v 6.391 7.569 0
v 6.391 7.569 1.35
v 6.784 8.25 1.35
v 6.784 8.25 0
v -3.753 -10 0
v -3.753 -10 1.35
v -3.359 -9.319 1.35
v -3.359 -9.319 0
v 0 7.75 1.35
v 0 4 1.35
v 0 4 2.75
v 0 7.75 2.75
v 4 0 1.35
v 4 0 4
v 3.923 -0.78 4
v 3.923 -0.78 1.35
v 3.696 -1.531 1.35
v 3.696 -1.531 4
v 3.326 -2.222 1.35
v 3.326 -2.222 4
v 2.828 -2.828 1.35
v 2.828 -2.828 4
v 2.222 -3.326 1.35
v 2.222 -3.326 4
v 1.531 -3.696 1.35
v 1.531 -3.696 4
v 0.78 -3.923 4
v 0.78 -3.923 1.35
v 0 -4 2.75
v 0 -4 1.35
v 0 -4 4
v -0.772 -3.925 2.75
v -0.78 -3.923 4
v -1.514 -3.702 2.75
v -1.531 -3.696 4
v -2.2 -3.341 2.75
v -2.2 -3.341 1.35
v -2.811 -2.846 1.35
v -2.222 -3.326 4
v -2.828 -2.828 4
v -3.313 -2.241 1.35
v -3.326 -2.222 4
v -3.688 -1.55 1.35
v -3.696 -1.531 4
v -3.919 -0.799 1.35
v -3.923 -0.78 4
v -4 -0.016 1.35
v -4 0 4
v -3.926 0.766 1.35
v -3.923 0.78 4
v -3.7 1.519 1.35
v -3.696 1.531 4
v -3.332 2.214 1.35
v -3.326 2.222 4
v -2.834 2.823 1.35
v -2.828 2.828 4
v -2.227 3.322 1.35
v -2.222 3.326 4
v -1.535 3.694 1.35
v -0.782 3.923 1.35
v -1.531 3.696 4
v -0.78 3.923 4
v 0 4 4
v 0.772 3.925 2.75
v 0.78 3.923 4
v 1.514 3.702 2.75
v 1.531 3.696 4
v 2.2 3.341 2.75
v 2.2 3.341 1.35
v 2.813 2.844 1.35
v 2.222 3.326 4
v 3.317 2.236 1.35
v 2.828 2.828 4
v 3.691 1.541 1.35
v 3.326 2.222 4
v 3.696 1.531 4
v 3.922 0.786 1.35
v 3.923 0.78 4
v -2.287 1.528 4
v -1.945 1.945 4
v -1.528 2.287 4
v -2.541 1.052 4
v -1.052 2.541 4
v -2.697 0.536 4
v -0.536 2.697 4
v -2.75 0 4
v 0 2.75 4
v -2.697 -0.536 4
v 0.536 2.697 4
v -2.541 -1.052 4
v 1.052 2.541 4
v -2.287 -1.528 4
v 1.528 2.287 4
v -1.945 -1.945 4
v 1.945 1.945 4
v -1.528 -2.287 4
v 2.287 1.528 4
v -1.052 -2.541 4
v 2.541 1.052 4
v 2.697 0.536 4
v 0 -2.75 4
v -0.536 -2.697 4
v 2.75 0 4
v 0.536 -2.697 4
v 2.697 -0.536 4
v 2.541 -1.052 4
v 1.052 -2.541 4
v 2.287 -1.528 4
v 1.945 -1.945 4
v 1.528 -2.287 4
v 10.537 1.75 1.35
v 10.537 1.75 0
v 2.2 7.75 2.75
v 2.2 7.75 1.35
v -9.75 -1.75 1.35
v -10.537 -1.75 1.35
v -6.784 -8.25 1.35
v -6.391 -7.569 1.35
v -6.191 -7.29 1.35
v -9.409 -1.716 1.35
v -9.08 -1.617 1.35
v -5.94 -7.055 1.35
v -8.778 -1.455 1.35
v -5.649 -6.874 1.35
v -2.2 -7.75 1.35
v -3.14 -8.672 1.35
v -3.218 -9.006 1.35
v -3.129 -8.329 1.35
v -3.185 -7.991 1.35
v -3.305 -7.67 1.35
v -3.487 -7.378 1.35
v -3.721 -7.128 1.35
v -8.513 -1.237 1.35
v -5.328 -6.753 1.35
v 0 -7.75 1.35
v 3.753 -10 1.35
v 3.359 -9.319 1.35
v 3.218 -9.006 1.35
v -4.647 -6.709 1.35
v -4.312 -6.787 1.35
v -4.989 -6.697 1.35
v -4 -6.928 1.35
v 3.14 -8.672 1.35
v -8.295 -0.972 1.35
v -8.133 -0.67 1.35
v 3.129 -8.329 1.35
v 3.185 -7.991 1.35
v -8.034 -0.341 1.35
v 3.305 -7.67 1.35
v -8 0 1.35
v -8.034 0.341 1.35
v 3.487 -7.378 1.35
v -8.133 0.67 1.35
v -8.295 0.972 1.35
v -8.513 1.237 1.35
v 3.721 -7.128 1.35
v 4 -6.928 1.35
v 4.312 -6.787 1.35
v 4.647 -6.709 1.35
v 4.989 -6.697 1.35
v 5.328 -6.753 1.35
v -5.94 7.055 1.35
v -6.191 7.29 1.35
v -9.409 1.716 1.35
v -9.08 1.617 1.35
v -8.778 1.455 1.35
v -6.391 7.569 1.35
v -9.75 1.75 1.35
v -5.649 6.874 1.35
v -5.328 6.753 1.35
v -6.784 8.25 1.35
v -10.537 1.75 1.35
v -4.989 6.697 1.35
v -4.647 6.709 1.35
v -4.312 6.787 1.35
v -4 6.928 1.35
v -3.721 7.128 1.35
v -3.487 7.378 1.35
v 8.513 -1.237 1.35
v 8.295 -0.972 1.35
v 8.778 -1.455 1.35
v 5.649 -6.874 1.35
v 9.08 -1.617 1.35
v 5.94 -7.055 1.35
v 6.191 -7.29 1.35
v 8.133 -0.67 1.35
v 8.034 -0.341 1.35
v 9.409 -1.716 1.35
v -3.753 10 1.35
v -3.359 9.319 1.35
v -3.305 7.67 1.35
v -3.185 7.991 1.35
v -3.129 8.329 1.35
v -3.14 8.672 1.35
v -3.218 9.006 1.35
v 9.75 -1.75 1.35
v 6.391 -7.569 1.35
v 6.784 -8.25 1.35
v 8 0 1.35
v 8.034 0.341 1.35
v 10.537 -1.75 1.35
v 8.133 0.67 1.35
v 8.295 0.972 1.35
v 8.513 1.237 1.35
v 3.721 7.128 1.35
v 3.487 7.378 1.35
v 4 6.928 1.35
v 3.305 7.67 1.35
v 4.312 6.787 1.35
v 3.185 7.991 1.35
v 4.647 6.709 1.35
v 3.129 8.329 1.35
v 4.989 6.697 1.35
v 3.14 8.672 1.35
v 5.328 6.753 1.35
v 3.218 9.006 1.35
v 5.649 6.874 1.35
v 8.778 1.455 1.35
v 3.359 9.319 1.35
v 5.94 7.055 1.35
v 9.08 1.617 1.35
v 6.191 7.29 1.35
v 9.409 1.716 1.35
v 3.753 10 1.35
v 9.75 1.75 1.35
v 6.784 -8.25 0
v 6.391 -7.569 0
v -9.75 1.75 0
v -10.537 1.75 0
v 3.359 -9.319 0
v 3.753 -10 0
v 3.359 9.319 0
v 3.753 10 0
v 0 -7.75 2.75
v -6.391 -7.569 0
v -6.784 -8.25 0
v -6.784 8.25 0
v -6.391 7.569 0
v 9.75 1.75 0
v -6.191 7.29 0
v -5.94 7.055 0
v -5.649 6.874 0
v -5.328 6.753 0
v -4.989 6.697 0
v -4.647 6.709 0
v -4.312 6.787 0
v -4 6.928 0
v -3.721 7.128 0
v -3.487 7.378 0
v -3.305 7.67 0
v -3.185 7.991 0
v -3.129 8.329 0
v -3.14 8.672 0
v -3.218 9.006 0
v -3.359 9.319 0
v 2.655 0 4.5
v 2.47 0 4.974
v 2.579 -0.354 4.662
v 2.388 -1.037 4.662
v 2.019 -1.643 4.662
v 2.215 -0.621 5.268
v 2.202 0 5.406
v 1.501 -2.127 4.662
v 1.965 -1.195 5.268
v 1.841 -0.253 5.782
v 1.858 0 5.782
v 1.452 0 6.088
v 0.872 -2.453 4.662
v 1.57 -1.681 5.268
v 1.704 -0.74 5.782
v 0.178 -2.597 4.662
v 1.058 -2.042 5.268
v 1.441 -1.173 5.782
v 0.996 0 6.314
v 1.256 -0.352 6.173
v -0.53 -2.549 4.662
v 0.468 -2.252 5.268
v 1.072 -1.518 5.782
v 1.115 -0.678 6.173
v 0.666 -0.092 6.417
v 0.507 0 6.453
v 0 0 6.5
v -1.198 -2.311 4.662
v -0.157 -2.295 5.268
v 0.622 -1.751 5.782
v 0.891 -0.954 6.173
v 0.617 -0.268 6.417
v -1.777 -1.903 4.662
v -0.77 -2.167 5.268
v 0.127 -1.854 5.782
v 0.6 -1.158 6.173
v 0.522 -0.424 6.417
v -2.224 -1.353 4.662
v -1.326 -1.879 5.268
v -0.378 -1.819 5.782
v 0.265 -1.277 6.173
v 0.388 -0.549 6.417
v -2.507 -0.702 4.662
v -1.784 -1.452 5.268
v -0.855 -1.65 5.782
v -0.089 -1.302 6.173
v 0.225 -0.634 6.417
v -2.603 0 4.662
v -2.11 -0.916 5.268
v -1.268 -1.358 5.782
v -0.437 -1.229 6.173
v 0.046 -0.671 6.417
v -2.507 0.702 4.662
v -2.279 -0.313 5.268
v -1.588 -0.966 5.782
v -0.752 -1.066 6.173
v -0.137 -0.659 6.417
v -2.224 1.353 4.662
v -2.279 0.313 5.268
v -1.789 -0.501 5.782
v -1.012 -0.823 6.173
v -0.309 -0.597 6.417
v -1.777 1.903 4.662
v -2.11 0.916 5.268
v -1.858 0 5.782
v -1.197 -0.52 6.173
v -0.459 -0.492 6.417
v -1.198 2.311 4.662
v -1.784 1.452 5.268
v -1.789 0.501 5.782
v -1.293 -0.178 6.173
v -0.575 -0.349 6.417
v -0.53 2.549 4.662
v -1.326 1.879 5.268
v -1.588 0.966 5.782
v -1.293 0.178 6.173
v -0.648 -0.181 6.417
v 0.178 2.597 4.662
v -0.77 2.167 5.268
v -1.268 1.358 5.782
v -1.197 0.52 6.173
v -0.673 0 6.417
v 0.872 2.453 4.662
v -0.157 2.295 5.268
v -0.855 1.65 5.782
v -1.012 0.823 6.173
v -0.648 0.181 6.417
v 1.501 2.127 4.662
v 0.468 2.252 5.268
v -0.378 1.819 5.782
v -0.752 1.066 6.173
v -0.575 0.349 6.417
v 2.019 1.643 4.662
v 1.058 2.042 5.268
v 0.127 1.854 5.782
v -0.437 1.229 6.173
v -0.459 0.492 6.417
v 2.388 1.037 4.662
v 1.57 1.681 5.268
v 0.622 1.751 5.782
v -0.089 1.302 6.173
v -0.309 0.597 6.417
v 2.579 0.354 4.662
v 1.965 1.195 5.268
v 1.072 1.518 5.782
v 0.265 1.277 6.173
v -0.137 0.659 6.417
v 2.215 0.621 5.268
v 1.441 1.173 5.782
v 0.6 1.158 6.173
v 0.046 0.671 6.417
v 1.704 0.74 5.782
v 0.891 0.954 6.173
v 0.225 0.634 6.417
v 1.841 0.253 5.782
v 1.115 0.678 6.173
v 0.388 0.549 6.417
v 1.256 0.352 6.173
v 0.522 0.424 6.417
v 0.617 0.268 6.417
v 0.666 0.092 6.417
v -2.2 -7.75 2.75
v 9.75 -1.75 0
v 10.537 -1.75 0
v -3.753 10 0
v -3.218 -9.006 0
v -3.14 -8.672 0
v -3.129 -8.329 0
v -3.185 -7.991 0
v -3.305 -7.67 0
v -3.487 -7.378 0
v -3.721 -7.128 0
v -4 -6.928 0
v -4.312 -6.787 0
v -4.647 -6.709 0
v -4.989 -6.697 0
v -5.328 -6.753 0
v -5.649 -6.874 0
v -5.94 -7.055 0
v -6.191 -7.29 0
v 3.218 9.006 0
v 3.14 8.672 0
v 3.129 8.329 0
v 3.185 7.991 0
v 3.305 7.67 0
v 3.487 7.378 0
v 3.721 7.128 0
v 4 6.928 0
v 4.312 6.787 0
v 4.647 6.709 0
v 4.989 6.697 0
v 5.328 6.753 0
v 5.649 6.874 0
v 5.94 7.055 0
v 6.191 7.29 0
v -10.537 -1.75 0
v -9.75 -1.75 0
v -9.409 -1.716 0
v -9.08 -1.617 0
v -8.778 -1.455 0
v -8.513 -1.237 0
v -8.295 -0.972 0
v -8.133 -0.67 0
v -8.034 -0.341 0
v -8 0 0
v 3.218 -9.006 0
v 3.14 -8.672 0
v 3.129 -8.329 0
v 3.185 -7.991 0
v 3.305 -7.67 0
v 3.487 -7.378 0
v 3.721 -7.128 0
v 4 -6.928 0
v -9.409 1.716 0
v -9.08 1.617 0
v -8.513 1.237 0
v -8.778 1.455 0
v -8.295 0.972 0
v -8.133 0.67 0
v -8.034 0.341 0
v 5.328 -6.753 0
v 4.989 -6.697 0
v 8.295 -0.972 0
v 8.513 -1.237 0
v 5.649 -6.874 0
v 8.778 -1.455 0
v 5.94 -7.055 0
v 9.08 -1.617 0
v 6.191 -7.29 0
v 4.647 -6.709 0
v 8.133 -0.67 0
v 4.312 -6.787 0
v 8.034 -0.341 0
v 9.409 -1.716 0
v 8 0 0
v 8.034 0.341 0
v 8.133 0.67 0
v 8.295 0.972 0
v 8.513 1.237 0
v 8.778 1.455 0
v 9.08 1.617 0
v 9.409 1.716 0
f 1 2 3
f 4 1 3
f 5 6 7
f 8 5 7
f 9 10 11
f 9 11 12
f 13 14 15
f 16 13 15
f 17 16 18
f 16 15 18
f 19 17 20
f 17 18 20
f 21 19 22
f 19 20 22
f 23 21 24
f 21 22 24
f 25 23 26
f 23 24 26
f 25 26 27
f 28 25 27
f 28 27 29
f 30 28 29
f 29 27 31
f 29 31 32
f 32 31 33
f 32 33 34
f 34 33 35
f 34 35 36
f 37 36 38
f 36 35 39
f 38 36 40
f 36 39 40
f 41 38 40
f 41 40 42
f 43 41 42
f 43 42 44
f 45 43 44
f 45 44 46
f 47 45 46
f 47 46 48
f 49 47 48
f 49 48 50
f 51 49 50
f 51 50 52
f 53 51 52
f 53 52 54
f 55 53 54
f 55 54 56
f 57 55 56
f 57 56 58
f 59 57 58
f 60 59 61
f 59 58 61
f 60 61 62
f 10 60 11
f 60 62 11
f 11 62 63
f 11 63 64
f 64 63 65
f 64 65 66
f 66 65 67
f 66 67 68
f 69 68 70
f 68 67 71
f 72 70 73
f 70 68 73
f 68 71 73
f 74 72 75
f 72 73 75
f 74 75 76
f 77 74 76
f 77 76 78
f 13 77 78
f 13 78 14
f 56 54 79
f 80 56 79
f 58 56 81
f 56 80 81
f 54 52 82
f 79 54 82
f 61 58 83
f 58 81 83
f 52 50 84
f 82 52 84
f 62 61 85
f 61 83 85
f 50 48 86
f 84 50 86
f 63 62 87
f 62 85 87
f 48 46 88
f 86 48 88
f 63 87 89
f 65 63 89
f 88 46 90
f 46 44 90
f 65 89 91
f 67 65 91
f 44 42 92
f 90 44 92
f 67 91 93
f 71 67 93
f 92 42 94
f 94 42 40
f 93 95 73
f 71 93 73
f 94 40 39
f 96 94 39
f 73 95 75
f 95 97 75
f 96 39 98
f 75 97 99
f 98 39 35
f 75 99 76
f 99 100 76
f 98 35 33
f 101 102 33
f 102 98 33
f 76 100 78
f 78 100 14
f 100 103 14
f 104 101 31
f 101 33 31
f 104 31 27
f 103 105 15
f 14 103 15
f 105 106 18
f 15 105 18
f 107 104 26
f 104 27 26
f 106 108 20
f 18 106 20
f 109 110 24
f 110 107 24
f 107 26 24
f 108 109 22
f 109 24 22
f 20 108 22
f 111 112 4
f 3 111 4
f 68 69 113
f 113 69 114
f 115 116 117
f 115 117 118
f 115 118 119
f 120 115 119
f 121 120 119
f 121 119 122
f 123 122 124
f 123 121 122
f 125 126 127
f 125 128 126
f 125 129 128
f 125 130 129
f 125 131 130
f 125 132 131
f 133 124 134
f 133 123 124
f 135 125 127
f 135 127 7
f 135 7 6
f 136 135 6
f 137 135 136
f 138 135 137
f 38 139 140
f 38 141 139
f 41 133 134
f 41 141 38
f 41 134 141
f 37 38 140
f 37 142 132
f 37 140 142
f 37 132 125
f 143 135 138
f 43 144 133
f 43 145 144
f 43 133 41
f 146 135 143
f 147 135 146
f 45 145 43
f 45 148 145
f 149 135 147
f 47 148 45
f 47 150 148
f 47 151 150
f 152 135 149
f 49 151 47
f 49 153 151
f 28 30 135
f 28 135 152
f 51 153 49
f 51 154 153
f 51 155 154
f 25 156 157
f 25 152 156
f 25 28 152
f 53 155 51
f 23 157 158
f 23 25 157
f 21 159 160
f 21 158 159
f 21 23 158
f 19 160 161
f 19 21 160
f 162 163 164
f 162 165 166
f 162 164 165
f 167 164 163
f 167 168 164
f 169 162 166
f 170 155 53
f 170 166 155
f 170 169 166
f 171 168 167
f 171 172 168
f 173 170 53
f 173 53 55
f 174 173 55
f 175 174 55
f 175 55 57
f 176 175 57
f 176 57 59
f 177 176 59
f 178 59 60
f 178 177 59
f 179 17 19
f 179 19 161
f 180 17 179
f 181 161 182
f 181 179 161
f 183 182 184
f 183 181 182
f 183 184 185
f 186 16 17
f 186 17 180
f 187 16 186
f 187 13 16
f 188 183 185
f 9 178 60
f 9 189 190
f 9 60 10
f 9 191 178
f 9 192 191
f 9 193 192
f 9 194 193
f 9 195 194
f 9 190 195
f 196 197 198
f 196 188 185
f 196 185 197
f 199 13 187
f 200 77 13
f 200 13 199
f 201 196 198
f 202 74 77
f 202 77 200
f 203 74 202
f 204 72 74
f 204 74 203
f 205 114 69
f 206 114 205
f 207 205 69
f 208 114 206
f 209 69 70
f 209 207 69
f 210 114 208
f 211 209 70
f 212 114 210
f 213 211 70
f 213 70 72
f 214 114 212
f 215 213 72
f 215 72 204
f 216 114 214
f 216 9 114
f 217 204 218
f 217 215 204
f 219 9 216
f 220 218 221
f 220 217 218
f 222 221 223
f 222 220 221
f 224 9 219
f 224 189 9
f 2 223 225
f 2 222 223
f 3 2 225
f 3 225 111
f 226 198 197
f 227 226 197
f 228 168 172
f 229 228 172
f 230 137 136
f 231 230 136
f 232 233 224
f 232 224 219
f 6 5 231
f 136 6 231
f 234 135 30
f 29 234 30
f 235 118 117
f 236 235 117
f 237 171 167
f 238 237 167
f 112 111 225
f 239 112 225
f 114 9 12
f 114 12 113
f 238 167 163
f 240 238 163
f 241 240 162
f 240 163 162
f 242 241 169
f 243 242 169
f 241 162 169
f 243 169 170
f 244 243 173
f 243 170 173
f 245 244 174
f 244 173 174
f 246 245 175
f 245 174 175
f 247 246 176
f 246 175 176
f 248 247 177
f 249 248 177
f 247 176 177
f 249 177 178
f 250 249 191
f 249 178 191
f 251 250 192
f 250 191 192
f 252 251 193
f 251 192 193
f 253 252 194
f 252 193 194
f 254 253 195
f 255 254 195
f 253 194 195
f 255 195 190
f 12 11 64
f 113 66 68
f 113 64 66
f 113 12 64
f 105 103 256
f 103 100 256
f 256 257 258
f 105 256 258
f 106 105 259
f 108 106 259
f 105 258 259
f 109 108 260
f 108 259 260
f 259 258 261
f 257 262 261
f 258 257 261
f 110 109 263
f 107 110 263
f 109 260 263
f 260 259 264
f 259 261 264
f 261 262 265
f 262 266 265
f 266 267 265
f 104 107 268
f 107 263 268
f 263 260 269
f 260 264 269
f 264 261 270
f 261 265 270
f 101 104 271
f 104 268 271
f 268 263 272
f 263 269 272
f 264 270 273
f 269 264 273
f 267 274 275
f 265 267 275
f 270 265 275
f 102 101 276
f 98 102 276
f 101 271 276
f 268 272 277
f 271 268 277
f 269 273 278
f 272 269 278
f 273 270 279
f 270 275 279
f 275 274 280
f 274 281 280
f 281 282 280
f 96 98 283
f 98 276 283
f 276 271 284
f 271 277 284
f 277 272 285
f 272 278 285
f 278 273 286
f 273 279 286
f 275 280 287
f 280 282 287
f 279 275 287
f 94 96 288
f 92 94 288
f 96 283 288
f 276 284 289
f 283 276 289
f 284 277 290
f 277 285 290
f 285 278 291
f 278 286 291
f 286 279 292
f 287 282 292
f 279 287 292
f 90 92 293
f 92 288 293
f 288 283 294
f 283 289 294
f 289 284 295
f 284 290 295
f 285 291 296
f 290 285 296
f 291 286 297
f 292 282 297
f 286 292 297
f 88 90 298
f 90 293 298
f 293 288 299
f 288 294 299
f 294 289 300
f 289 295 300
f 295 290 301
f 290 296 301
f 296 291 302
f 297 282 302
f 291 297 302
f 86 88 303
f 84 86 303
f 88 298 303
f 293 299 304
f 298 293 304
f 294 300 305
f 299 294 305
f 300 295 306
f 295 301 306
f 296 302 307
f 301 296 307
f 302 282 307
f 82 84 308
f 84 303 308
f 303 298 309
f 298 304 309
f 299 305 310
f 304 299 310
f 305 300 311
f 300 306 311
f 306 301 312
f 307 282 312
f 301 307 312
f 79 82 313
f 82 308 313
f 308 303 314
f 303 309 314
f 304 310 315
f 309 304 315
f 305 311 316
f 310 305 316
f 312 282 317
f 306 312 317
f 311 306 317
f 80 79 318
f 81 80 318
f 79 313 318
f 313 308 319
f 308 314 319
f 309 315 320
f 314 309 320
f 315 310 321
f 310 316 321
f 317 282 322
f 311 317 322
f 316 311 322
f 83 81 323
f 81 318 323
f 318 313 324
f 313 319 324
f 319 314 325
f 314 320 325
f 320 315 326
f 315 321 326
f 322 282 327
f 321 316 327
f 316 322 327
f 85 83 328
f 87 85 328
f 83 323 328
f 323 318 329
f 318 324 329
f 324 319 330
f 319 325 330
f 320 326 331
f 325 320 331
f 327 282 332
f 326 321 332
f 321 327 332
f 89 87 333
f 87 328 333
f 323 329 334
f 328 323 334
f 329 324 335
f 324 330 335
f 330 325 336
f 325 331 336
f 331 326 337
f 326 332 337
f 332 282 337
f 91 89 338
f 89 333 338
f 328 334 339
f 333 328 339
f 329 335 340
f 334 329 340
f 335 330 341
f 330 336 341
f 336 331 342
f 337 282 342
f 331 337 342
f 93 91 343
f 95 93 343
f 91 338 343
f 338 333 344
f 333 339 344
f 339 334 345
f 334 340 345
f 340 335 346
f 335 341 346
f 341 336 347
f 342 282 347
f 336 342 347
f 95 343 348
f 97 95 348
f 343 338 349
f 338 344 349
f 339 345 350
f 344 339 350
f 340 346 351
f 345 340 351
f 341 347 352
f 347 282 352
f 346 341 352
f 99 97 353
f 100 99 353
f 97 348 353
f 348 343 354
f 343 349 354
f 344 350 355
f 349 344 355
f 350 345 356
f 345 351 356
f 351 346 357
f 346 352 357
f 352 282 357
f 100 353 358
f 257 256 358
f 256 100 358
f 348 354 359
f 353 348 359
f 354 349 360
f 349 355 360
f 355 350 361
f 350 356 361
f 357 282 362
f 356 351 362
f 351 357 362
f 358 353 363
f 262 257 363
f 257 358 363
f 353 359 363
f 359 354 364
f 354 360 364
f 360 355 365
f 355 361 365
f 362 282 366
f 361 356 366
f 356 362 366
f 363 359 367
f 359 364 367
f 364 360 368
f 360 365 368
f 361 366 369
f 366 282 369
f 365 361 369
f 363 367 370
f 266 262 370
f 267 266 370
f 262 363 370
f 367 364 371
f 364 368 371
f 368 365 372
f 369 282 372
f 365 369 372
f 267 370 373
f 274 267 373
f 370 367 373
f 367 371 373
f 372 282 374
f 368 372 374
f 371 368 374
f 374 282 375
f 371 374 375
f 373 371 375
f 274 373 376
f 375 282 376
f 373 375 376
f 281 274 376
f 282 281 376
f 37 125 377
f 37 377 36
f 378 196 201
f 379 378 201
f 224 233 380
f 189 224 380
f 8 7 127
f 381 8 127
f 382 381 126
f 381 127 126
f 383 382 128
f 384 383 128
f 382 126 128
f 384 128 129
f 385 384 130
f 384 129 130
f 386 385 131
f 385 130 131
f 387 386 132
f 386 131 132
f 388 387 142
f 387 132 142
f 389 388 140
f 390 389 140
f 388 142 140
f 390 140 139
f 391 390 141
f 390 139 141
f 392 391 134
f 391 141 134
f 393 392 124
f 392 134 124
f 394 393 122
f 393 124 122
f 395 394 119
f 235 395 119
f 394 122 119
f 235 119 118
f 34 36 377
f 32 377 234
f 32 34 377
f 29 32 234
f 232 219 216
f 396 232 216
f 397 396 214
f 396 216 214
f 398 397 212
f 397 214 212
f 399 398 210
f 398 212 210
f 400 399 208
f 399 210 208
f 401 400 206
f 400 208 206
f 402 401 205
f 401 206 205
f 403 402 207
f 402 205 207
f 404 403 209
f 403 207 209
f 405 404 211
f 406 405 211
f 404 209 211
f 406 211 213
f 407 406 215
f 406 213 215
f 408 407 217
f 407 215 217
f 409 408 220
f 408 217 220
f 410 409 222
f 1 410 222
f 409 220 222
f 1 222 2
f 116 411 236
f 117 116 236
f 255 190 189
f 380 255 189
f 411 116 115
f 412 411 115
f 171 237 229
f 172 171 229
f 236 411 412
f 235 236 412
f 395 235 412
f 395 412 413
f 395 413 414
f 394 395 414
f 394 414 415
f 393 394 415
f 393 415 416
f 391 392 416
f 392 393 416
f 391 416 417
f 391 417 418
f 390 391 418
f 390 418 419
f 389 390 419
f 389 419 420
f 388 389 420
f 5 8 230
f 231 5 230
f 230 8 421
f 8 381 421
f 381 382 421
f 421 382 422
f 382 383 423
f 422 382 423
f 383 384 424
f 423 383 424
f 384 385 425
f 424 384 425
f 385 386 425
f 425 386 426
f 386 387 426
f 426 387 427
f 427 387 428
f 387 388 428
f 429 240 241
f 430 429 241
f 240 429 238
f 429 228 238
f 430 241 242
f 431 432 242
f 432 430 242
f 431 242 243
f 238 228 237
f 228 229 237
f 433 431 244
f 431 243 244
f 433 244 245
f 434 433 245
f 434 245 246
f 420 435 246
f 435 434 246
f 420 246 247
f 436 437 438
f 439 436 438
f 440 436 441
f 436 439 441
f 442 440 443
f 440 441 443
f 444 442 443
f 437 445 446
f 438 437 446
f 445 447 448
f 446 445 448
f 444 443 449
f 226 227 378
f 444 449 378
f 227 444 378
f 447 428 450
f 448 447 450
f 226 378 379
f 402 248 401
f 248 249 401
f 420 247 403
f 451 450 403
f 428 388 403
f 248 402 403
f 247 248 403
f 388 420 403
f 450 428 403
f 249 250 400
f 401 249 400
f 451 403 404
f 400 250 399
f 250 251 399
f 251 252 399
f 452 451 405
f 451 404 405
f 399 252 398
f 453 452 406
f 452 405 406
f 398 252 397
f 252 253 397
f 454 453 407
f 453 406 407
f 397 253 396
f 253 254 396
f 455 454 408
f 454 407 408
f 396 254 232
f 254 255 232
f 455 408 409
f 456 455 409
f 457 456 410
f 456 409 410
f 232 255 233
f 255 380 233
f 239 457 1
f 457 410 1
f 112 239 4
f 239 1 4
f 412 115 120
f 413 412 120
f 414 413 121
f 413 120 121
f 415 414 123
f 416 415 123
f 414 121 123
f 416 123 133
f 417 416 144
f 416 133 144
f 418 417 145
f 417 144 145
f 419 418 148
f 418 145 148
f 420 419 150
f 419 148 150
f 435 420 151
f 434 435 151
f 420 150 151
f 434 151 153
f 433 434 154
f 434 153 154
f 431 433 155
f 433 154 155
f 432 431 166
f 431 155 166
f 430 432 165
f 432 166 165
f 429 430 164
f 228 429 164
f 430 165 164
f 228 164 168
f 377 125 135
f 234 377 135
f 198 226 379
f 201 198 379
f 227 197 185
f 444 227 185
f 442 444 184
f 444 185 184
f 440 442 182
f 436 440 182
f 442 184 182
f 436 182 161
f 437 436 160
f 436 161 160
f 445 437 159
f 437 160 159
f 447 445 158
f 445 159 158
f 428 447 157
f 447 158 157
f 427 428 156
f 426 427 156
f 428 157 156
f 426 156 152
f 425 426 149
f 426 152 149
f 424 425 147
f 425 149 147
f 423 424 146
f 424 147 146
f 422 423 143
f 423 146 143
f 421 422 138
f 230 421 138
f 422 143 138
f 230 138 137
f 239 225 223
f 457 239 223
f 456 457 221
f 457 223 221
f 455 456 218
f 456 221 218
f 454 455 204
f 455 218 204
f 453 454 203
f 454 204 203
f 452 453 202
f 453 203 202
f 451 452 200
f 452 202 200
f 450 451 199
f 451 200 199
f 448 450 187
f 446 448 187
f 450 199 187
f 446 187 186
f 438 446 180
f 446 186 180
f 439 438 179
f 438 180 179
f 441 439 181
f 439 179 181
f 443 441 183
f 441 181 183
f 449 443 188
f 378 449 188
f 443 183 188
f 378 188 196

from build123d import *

# Parameters (mm, degrees)
BOSS_EXTRUDE1_DEPTH = 1.35
CUT_EXTRUDE1_DEPTH  = 16.334791597
CIRPATTERN1_COUNT   = 6
SKETCH5_W           = 2.2
SKETCH5_H           = 4.409341382
BOSS_EXTRUDE2_DEPTH = 1.4


with BuildPart() as part:
    # Sketch1 → Boss-Extrude1 (new body)
    with BuildSketch(Plane.XY):
        Polygon((5.773502692, 10), (-5.773502692, 10), (-11.547005384, 0), (-5.773502692, -10), (5.773502692, -10), (11.547005384, 0), align=None)
    extrude(amount=BOSS_EXTRUDE1_DEPTH)

    # Sketch2 → Cut-Extrude1 (cut, through all)
    with BuildSketch(Plane.XY.offset(1.35)):
        with BuildLine():
            Line((-9.75, 1.75), (-11.547005384, 1.75))
            Line((-11.547005384, 1.75), (-11.547005384, -1.75))
            Line((-11.547005384, -1.75), (-9.75, -1.75))
            ThreePointArc((-9.75, -1.75), (-8, 0), (-9.75, 1.75))
        make_face()
    cut_extrude1 = extrude(amount=-CUT_EXTRUDE1_DEPTH, mode=Mode.SUBTRACT)

    # CirPattern1: Cut-Extrude1 ×6 about axis
    cirpattern1_axis = Axis((0, 0, -0.0675), (0, 0, 1))
    for i in range(1, CIRPATTERN1_COUNT):
        add(cut_extrude1.rotate(cirpattern1_axis, i * 360 / CIRPATTERN1_COUNT), mode=Mode.SUBTRACT)

    # Sketch4 → Revolve1 (revolve)
    with BuildSketch(Plane(origin=(0, 0, 0), x_dir=(1, 0, 0), z_dir=(0, 1, 0))):
        with BuildLine():
            Line((-4, -1.35), (-4, -4))
            Line((-4, -4), (-2.75, -4))
            ThreePointArc((-2.75, -4), (-1.858258593, -5.781584453), (0, -6.5))
            Line((0, -6.5), (0, -1.35))
            Line((0, -1.35), (-4, -1.35))
        make_face()
    revolve(axis=Axis((0, 0, 6.5), (0, 0, -1)))

    # Sketch5 → Boss-Extrude2 (add)
    with BuildSketch(Plane.XY.offset(1.35)):
        with Locations((1.1, 5.545329309)):
            Rectangle(SKETCH5_W, SKETCH5_H)
        with Locations((-1.1, -5.545329309)):
            Rectangle(SKETCH5_W, SKETCH5_H)
    extrude(amount=BOSS_EXTRUDE2_DEPTH)


solid = part.part
